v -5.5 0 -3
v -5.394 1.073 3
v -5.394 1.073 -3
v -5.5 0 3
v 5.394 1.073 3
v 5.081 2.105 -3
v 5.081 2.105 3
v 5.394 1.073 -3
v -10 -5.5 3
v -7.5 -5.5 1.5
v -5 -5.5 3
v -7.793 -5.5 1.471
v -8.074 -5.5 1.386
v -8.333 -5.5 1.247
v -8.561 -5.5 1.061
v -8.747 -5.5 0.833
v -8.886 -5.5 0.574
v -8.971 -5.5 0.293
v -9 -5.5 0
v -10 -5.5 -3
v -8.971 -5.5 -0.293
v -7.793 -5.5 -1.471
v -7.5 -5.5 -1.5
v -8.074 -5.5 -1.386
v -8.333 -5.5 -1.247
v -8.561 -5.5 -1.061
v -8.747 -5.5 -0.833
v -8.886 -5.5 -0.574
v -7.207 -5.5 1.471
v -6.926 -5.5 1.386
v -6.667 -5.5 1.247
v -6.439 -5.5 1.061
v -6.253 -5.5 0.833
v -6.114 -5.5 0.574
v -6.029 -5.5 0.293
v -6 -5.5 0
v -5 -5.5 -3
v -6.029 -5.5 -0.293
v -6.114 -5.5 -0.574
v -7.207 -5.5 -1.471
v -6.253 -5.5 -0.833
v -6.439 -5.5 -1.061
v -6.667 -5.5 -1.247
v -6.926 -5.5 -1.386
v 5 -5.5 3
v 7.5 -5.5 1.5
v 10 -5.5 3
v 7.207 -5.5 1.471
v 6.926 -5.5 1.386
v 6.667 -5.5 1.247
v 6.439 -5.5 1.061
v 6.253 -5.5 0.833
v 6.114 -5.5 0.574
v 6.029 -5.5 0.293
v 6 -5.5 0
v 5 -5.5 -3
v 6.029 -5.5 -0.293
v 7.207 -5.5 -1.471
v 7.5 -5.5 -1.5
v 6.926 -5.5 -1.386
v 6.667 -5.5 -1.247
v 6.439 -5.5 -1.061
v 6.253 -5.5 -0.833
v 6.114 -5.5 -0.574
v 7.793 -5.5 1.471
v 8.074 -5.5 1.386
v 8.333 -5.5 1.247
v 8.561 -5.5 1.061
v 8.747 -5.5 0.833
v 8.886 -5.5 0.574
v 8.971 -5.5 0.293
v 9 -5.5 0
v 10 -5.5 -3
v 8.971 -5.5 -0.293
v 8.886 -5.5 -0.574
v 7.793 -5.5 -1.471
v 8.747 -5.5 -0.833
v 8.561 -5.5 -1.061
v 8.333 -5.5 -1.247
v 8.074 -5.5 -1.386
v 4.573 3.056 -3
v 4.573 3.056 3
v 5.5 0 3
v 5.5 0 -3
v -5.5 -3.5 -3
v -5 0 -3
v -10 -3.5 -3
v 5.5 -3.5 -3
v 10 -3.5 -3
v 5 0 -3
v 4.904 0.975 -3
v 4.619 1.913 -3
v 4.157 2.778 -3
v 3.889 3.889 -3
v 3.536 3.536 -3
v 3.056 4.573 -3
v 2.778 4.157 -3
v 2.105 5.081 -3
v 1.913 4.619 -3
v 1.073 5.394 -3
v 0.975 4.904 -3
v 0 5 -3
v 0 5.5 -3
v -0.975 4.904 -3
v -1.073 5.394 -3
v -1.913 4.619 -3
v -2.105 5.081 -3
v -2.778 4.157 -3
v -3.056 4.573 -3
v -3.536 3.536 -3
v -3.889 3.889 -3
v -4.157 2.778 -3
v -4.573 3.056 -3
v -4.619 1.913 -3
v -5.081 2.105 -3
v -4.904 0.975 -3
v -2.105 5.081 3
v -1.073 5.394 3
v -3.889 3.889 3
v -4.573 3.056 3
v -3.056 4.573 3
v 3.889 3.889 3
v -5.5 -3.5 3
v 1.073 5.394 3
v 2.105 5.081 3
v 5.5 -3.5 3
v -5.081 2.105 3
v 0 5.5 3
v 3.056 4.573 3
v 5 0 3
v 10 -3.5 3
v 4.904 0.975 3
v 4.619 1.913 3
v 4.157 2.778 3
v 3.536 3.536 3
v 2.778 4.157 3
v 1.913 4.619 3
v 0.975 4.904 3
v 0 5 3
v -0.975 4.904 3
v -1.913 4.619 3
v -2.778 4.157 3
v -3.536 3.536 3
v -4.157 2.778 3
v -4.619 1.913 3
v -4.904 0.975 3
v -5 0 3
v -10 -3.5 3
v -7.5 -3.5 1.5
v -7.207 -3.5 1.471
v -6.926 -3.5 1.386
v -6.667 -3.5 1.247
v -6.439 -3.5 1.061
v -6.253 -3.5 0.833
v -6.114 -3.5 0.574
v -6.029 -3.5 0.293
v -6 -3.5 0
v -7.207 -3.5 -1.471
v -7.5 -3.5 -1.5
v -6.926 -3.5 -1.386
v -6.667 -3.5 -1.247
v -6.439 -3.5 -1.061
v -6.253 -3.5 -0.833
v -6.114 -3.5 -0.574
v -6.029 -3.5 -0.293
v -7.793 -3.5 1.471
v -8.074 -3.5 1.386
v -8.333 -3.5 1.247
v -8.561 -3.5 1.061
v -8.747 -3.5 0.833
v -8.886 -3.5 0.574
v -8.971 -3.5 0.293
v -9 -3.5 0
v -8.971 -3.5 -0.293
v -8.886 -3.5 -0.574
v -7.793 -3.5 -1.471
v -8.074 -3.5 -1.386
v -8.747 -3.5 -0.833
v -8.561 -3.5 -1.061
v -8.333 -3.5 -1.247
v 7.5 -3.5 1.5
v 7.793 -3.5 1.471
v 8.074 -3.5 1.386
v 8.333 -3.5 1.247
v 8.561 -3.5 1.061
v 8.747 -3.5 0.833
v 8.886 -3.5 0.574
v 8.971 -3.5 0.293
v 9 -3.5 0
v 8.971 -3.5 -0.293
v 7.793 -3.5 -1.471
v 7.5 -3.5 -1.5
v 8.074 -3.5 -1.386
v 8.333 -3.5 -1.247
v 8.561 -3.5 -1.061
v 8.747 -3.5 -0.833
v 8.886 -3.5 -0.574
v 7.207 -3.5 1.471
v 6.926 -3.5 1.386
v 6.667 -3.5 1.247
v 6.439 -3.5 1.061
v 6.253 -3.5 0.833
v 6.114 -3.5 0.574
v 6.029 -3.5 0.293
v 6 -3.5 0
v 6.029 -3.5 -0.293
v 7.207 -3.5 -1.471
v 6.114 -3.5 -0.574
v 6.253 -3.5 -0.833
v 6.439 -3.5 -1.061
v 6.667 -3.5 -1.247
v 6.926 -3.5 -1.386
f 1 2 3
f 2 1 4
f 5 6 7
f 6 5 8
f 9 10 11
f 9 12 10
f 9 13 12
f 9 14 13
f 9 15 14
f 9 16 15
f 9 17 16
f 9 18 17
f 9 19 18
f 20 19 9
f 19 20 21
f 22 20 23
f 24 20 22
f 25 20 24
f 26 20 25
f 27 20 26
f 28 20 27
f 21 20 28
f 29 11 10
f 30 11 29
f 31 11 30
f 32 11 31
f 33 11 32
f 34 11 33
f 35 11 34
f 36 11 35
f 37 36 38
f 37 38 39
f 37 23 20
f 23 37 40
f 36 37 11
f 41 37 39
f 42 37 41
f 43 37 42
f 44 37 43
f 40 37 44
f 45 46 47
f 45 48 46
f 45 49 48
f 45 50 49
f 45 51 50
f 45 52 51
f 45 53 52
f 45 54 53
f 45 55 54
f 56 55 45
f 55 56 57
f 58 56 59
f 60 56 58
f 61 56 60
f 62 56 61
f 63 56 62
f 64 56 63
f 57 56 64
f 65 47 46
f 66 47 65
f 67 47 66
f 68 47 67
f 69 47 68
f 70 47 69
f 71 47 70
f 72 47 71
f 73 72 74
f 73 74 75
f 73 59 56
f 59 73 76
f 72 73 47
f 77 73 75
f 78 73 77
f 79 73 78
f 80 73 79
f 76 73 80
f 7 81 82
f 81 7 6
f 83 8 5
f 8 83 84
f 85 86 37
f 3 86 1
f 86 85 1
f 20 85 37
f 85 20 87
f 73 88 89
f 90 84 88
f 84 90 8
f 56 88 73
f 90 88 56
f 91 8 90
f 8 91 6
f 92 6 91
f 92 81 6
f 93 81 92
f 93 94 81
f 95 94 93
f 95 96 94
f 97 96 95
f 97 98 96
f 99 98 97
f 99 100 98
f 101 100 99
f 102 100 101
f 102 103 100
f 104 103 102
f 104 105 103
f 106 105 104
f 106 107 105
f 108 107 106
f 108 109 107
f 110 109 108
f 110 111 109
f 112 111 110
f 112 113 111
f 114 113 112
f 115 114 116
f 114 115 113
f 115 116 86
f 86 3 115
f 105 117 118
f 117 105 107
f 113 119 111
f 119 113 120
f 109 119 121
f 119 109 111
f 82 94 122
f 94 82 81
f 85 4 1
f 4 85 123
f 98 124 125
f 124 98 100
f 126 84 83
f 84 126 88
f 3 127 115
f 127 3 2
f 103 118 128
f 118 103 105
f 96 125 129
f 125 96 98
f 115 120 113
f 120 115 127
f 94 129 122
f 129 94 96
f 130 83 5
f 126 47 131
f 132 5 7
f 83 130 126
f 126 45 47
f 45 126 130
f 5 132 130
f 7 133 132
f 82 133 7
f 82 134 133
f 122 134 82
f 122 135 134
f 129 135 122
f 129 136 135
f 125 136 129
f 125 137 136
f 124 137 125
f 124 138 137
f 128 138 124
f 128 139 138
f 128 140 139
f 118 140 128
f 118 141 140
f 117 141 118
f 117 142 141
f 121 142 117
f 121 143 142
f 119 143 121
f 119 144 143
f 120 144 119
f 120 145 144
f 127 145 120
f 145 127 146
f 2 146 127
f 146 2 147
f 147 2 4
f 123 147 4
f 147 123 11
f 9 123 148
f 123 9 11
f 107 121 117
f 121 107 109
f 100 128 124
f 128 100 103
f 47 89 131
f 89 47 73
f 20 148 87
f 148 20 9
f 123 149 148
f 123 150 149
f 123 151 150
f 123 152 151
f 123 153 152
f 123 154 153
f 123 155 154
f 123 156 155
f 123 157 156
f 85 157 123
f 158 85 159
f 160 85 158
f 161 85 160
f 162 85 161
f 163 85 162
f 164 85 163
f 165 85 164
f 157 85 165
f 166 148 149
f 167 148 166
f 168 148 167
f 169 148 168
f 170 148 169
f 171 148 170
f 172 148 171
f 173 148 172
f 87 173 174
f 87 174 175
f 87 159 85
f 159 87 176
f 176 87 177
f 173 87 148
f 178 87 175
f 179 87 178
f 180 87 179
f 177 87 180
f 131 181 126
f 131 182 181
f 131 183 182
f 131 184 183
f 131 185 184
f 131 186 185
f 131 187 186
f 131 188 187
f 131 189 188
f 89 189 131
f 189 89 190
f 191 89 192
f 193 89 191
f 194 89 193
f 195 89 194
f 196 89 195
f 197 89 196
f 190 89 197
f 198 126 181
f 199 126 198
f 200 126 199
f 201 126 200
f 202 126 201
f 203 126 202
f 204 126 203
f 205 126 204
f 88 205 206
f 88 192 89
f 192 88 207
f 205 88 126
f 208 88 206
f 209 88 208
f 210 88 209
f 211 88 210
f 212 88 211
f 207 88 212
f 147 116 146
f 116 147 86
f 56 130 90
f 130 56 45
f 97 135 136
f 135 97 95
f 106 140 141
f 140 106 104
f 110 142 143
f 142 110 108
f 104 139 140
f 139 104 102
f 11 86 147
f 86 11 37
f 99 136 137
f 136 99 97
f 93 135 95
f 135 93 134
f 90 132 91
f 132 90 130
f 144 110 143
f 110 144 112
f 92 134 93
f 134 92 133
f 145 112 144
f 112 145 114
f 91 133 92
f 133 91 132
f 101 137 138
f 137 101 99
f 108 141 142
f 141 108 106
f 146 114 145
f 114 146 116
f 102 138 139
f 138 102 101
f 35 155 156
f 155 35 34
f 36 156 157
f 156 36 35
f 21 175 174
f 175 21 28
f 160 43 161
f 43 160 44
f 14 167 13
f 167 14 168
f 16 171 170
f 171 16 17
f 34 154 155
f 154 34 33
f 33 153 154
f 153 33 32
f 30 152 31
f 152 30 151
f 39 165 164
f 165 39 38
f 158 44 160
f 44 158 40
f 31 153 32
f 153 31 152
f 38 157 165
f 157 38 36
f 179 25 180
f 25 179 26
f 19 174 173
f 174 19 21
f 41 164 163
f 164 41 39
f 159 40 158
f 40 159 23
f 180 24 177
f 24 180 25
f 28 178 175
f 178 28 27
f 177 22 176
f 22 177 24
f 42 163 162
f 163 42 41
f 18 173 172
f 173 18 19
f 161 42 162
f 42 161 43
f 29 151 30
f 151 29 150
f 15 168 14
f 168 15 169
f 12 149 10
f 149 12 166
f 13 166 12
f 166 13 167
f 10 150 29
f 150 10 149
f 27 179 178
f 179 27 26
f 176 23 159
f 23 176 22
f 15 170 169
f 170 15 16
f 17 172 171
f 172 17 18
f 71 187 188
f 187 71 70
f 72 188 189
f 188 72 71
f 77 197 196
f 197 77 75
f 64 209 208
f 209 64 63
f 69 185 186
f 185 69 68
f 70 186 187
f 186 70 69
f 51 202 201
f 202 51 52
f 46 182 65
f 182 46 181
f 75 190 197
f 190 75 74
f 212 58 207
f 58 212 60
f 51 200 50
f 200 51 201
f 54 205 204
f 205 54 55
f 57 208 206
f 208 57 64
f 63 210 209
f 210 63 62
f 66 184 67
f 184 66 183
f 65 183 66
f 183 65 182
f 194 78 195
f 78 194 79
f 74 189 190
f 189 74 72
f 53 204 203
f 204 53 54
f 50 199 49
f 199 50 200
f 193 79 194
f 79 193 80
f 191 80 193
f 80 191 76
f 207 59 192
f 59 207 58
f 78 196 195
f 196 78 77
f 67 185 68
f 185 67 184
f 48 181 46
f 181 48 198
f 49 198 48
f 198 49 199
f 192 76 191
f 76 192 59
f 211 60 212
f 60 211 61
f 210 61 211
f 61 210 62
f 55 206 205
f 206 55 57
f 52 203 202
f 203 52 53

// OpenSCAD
// file: ../operators/shortcuts.scad
// Translate
module tra(v) { translate(v) children(); }
module trax(x) { translate([x, 0, 0]) children(); }
module tray(y) { translate([0, y, 0]) children(); }
module traz(z) { translate([0, 0, z]) children(); }

// Scale
module sca(v) { scale(v) children(); }
module scax(x) { scale([x, 1, 1]) children(); }
module scay(y) { scale([1, y, 1]) children(); }
module scaz(z) { scale([1, 1, z]) children(); }

// Rotate
module rot(a, v) { rotate(a, v) children(); }
module rotx(x) { rotate([x, 0, 0]) children(); }
module roty(y) { rotate([0, y, 0]) children(); }
module rotz(z) { rotate([0, 0, z]) children(); }

// Symmetry
module sym(v) { mirror(v) children(); }
module symx() { mirror([1, 0, 0]) children(); }
module symy() { mirror([0, 1, 0]) children(); }
module symz() { mirror([0, 0, 1]) children(); }

// Mirror
module mir(v) { children(); mirror(v) children(); }
module mirx() { children(); mirror([1, 0, 0]) children(); }
module miry() { children(); mirror([0, 1, 0]) children(); }
module mirz() { children(); mirror([0, 0, 1]) children(); }
// main file
include <../operators/shortcuts.scad>

module wireHolder() {
    module hole(d) { cylinder(d = d, h = 6, center = true, $fn = 32); }
    module screwBase(x) { tray(-4.5) cube([x, 2, 6], center = true); }

    module arch(d) {
        hull() {
            hole(d);
            screwBase(d);
        }
    }

    module base() {
        union() {
            arch(d = 11);
            screwBase(x = 20);
        }
    }

    module holes() {
        arch(d = 10);
        tra([-7.5, -4.5, 0]) rotx(90) hole(d = 3);
        tra([7.5, -4.5, 0]) rotx(90) hole(d = 3);
    }

    difference() {
        base();
        holes();
    }
}

wireHolder();
